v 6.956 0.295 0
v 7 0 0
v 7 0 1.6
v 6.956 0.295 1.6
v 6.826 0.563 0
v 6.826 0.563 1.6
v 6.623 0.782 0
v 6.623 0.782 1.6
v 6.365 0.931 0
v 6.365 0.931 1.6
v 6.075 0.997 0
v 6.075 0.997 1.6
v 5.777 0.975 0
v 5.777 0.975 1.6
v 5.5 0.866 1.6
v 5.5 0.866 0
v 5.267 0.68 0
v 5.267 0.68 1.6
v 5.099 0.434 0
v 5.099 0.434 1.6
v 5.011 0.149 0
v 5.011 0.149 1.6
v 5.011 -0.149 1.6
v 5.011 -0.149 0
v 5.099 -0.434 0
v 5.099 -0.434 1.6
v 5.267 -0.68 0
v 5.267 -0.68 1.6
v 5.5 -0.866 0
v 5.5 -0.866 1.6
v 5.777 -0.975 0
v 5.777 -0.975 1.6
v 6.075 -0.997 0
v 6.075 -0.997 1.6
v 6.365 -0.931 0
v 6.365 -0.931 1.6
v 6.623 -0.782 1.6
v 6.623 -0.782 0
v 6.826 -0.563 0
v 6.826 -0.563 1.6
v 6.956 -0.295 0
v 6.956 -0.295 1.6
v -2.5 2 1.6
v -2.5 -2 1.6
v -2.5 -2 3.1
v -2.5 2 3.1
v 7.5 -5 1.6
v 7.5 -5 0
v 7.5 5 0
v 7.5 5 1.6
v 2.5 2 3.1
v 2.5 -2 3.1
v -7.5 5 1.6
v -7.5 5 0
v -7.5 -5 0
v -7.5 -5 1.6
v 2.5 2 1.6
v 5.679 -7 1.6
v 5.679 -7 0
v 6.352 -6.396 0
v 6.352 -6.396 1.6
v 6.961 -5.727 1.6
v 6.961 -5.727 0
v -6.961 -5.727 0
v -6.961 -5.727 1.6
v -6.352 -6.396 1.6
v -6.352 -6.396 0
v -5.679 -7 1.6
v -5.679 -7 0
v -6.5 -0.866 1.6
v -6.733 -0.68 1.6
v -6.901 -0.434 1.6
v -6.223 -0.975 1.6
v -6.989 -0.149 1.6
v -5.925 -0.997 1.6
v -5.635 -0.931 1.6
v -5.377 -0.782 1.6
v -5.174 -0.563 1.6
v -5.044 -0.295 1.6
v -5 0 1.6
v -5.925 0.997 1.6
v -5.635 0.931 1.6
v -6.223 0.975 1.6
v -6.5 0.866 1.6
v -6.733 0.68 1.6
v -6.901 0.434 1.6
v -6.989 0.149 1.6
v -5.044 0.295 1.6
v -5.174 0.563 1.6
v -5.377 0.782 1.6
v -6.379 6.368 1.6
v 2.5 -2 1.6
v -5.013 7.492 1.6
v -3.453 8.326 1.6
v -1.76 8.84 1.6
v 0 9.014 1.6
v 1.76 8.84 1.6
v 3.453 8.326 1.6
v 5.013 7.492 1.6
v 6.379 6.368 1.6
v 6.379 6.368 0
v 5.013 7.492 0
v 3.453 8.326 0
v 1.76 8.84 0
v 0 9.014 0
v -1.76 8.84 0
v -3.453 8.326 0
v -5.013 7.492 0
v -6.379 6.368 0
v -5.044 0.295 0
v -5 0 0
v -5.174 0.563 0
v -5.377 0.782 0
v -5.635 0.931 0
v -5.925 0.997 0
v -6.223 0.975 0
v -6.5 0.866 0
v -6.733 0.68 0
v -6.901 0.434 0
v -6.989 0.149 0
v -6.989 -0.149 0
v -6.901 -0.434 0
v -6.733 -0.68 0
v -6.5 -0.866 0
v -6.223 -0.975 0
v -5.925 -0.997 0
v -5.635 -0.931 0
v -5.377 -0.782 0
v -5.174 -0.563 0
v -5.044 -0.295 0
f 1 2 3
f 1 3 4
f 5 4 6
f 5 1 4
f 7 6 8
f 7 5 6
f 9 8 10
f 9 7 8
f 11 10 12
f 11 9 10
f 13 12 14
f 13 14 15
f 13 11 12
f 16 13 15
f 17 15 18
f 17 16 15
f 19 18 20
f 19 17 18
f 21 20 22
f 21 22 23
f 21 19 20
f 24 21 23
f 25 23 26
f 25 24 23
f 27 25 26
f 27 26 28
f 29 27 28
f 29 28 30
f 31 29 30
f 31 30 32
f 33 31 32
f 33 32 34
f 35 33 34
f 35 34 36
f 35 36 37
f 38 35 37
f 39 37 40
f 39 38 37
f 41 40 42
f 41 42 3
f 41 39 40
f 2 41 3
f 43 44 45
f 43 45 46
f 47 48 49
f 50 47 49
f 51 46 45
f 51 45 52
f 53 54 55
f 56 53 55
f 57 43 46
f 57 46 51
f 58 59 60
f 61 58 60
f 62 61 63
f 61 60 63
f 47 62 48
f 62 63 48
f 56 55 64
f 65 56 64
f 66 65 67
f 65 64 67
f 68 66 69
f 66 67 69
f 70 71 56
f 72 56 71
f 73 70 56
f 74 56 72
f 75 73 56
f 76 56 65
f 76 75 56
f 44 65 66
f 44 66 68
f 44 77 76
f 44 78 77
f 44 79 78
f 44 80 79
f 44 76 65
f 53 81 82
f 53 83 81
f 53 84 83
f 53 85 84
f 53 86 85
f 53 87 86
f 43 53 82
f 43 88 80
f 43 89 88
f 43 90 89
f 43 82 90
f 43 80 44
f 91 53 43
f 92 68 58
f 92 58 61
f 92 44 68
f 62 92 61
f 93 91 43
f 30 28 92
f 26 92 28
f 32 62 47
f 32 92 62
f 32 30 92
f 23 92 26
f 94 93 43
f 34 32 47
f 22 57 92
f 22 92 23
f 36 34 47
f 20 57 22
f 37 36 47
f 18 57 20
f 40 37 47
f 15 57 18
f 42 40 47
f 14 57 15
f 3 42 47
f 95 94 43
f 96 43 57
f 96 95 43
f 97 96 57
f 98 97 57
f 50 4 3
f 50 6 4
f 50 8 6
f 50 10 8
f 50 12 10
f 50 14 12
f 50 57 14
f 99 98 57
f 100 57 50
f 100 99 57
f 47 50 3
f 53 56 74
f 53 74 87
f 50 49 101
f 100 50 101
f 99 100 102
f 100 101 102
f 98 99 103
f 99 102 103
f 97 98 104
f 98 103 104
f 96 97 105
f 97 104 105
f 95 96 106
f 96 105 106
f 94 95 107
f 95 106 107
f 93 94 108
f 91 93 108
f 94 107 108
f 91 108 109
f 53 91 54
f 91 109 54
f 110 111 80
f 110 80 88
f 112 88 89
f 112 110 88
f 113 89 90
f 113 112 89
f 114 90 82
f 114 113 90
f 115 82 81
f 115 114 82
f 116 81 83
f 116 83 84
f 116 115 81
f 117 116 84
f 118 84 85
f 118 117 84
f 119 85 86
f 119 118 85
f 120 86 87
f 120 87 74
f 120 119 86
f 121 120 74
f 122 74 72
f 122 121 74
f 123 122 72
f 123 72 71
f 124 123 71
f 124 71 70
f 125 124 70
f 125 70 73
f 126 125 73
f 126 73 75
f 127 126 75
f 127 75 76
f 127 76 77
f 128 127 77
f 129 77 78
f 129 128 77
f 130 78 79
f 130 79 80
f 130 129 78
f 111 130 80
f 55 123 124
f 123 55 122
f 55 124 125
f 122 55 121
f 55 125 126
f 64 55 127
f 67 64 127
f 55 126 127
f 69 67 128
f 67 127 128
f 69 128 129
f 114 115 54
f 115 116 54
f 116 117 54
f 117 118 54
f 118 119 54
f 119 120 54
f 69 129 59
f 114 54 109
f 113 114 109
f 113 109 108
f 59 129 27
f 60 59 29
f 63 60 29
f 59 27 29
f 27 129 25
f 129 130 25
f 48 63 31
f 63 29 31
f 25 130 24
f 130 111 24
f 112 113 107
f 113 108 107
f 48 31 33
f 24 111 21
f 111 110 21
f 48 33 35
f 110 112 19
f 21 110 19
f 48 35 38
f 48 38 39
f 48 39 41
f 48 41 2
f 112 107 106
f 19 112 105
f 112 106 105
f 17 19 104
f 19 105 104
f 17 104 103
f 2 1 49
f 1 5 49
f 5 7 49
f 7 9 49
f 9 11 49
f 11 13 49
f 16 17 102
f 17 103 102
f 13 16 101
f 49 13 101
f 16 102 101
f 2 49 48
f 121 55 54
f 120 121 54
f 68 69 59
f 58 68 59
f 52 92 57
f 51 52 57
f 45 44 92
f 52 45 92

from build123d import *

# Parameters (mm, degrees)
SKETCH1_R           = 1
BOSS_EXTRUDE1_DEPTH = 1.6
SKETCH2_W           = 5
SKETCH2_H           = 4
BOSS_EXTRUDE2_DEPTH = 1.5


with BuildPart() as part:
    # Sketch1 → Boss-Extrude1 (new body)
    with BuildSketch(Plane.XY):
        with BuildLine():
            Line((-5.678908346, -7), (5.678908346, -7))
            ThreePointArc((5.678908346, -7), (6.664901072, -6.068697859), (7.5, -5))
            Line((7.5, -5), (7.5, 5))
            ThreePointArc((7.5, 5), (0, 9.013878189), (-7.5, 5))
            Line((-7.5, 5), (-7.5, -5))
            ThreePointArc((-7.5, -5), (-6.664901072, -6.068697859), (-5.678908346, -7))
        make_face()
        with Locations((-6, 0)):
            Circle(SKETCH1_R, mode=Mode.SUBTRACT)
        with Locations((6, 0)):
            Circle(SKETCH1_R, mode=Mode.SUBTRACT)
    extrude(amount=BOSS_EXTRUDE1_DEPTH)

    # Sketch2 → Boss-Extrude2 (add)
    with BuildSketch(Plane.XY.offset(1.6)):
        Rectangle(SKETCH2_W, SKETCH2_H)
    extrude(amount=BOSS_EXTRUDE2_DEPTH)


solid = part.part
